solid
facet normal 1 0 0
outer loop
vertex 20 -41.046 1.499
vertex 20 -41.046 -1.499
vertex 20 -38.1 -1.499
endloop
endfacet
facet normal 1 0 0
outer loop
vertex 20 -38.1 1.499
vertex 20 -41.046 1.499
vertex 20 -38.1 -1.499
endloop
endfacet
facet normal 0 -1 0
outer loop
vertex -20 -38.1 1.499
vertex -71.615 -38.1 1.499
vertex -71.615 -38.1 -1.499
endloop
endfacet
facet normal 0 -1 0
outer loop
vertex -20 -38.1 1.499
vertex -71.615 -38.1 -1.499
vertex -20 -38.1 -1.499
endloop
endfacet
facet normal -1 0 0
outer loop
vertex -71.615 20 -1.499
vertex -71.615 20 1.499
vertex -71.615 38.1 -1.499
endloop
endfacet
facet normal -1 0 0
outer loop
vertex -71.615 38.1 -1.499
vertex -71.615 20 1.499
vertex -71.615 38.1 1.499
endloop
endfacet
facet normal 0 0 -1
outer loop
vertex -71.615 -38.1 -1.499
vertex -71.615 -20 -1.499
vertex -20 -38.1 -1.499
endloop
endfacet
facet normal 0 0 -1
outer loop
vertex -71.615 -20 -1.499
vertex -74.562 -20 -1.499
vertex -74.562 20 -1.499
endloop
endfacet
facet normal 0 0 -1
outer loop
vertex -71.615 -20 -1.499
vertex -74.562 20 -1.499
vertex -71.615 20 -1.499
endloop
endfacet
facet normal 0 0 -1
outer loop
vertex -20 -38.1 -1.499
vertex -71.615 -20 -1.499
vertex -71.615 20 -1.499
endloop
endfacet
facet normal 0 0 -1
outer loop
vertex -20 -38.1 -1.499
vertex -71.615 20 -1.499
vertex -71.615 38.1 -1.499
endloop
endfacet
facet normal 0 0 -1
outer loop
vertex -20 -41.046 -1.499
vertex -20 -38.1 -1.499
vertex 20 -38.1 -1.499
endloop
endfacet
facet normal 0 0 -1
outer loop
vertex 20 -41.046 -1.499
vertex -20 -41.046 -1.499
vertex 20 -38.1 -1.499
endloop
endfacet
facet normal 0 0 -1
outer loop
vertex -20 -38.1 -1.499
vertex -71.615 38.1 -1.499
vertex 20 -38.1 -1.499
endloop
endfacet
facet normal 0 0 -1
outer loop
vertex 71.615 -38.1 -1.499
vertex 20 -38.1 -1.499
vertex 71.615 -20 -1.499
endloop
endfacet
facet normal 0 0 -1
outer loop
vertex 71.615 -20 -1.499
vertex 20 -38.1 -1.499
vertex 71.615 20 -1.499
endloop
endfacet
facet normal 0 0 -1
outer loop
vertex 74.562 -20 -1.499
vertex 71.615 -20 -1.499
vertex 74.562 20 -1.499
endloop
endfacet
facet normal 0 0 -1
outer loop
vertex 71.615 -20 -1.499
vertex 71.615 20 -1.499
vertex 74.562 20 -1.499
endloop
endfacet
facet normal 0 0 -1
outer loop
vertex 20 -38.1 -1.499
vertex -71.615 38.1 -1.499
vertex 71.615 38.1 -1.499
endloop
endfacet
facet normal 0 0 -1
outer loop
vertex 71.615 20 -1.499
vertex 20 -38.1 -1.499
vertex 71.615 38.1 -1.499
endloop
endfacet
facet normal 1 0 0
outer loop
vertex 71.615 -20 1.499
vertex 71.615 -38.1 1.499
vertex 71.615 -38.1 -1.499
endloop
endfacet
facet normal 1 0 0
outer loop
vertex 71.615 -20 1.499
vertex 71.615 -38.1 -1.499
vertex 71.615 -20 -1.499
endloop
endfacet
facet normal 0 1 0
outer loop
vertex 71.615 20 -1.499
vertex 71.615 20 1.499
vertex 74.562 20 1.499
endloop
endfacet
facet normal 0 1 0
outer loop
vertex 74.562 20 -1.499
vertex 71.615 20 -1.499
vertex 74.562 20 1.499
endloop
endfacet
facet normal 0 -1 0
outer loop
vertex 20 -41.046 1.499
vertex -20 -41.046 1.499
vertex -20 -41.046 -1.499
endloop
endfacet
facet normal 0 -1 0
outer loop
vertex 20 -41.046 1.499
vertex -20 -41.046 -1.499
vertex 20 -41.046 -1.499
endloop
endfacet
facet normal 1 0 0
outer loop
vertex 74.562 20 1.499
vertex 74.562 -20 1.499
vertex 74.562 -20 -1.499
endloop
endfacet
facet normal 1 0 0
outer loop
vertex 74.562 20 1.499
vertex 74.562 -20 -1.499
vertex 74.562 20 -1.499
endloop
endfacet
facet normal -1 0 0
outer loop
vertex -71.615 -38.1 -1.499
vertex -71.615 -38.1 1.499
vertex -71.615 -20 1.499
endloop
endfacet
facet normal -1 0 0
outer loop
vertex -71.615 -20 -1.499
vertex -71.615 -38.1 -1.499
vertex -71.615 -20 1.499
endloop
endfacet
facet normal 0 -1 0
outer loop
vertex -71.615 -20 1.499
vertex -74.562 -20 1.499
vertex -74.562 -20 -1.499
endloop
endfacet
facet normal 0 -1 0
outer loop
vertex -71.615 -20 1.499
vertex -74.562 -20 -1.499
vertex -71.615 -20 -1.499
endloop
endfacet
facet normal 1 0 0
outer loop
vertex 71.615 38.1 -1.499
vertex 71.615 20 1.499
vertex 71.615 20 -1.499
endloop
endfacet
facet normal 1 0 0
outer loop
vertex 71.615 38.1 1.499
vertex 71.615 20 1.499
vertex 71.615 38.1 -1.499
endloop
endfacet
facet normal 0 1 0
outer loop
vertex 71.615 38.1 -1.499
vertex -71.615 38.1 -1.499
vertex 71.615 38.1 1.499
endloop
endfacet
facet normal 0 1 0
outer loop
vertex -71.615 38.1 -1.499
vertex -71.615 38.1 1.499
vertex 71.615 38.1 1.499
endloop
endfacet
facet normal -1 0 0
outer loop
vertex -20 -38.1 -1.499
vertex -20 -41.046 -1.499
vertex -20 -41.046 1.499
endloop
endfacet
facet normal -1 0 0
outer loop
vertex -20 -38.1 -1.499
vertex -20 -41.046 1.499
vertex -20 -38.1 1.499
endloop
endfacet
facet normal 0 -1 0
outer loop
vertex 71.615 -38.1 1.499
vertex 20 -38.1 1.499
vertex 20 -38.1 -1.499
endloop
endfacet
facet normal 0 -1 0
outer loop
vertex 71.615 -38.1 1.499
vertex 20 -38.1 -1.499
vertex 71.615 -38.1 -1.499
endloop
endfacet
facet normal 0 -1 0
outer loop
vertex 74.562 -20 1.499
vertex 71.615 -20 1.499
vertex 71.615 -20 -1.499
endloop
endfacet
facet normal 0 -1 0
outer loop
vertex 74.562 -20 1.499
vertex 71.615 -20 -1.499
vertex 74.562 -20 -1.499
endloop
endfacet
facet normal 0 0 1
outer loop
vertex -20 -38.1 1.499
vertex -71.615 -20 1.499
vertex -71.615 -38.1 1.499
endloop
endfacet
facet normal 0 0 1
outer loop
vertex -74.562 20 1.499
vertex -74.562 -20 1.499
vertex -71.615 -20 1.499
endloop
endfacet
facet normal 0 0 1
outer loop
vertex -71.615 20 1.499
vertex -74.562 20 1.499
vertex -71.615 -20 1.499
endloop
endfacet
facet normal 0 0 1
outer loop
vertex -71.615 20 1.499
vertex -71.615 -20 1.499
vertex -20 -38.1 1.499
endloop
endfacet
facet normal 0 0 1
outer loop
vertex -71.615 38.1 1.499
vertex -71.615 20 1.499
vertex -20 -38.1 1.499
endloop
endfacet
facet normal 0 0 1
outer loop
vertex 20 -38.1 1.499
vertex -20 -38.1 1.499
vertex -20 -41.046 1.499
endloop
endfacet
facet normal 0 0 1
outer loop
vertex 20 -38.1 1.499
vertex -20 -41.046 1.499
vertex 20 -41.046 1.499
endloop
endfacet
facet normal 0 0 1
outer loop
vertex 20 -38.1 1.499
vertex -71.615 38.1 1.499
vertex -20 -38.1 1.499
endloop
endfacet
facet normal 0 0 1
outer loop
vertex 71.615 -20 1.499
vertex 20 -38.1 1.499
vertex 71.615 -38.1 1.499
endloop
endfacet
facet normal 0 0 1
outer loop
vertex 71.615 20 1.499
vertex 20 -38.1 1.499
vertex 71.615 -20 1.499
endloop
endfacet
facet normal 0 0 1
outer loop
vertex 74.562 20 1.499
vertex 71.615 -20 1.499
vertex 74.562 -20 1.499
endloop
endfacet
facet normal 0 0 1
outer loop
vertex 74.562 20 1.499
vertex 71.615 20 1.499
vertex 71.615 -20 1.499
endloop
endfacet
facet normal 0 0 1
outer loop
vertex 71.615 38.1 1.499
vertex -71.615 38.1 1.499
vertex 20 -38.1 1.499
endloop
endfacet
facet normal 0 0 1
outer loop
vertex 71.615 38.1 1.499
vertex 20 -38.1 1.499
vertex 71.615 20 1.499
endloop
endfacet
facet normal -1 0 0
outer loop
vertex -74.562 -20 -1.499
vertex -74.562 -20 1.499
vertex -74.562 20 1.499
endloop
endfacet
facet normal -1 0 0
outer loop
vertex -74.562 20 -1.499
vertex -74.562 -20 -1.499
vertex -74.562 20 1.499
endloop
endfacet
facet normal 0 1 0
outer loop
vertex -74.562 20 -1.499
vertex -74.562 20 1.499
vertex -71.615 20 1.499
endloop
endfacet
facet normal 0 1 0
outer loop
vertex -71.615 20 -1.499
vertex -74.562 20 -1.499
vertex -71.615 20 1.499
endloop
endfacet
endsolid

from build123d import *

# Parameters (mm, degrees)
SKETCH1_W           = 143.2306
SKETCH1_H           = 76.2
BOSS_EXTRUDE1_DEPTH = 1.4986
SKETCH2_W           = 2.9464
SKETCH2_H           = 40
SKETCH2_W_2         = 40
SKETCH2_H_2         = 2.9464
BOSS_EXTRUDE2_DEPTH = 2.9972


with BuildPart() as part:
    # Sketch1 → Boss-Extrude1 (new body, symmetric)
    with BuildSketch(Plane.XY):
        Rectangle(SKETCH1_W, SKETCH1_H)
    extrude(amount=BOSS_EXTRUDE1_DEPTH, both=True)

    # Sketch2 → Boss-Extrude2 (add, through all)
    with BuildSketch(Plane.XY.offset(1.4986)):
        with Locations((-73.0885, 0)):
            Rectangle(SKETCH2_W, SKETCH2_H)
        with Locations((0, -39.5732)):
            Rectangle(SKETCH2_W_2, SKETCH2_H_2)
        with Locations((73.0885, 0)):
            Rectangle(SKETCH2_W, SKETCH2_H)
    extrude(amount=-BOSS_EXTRUDE2_DEPTH)


solid = part.part
